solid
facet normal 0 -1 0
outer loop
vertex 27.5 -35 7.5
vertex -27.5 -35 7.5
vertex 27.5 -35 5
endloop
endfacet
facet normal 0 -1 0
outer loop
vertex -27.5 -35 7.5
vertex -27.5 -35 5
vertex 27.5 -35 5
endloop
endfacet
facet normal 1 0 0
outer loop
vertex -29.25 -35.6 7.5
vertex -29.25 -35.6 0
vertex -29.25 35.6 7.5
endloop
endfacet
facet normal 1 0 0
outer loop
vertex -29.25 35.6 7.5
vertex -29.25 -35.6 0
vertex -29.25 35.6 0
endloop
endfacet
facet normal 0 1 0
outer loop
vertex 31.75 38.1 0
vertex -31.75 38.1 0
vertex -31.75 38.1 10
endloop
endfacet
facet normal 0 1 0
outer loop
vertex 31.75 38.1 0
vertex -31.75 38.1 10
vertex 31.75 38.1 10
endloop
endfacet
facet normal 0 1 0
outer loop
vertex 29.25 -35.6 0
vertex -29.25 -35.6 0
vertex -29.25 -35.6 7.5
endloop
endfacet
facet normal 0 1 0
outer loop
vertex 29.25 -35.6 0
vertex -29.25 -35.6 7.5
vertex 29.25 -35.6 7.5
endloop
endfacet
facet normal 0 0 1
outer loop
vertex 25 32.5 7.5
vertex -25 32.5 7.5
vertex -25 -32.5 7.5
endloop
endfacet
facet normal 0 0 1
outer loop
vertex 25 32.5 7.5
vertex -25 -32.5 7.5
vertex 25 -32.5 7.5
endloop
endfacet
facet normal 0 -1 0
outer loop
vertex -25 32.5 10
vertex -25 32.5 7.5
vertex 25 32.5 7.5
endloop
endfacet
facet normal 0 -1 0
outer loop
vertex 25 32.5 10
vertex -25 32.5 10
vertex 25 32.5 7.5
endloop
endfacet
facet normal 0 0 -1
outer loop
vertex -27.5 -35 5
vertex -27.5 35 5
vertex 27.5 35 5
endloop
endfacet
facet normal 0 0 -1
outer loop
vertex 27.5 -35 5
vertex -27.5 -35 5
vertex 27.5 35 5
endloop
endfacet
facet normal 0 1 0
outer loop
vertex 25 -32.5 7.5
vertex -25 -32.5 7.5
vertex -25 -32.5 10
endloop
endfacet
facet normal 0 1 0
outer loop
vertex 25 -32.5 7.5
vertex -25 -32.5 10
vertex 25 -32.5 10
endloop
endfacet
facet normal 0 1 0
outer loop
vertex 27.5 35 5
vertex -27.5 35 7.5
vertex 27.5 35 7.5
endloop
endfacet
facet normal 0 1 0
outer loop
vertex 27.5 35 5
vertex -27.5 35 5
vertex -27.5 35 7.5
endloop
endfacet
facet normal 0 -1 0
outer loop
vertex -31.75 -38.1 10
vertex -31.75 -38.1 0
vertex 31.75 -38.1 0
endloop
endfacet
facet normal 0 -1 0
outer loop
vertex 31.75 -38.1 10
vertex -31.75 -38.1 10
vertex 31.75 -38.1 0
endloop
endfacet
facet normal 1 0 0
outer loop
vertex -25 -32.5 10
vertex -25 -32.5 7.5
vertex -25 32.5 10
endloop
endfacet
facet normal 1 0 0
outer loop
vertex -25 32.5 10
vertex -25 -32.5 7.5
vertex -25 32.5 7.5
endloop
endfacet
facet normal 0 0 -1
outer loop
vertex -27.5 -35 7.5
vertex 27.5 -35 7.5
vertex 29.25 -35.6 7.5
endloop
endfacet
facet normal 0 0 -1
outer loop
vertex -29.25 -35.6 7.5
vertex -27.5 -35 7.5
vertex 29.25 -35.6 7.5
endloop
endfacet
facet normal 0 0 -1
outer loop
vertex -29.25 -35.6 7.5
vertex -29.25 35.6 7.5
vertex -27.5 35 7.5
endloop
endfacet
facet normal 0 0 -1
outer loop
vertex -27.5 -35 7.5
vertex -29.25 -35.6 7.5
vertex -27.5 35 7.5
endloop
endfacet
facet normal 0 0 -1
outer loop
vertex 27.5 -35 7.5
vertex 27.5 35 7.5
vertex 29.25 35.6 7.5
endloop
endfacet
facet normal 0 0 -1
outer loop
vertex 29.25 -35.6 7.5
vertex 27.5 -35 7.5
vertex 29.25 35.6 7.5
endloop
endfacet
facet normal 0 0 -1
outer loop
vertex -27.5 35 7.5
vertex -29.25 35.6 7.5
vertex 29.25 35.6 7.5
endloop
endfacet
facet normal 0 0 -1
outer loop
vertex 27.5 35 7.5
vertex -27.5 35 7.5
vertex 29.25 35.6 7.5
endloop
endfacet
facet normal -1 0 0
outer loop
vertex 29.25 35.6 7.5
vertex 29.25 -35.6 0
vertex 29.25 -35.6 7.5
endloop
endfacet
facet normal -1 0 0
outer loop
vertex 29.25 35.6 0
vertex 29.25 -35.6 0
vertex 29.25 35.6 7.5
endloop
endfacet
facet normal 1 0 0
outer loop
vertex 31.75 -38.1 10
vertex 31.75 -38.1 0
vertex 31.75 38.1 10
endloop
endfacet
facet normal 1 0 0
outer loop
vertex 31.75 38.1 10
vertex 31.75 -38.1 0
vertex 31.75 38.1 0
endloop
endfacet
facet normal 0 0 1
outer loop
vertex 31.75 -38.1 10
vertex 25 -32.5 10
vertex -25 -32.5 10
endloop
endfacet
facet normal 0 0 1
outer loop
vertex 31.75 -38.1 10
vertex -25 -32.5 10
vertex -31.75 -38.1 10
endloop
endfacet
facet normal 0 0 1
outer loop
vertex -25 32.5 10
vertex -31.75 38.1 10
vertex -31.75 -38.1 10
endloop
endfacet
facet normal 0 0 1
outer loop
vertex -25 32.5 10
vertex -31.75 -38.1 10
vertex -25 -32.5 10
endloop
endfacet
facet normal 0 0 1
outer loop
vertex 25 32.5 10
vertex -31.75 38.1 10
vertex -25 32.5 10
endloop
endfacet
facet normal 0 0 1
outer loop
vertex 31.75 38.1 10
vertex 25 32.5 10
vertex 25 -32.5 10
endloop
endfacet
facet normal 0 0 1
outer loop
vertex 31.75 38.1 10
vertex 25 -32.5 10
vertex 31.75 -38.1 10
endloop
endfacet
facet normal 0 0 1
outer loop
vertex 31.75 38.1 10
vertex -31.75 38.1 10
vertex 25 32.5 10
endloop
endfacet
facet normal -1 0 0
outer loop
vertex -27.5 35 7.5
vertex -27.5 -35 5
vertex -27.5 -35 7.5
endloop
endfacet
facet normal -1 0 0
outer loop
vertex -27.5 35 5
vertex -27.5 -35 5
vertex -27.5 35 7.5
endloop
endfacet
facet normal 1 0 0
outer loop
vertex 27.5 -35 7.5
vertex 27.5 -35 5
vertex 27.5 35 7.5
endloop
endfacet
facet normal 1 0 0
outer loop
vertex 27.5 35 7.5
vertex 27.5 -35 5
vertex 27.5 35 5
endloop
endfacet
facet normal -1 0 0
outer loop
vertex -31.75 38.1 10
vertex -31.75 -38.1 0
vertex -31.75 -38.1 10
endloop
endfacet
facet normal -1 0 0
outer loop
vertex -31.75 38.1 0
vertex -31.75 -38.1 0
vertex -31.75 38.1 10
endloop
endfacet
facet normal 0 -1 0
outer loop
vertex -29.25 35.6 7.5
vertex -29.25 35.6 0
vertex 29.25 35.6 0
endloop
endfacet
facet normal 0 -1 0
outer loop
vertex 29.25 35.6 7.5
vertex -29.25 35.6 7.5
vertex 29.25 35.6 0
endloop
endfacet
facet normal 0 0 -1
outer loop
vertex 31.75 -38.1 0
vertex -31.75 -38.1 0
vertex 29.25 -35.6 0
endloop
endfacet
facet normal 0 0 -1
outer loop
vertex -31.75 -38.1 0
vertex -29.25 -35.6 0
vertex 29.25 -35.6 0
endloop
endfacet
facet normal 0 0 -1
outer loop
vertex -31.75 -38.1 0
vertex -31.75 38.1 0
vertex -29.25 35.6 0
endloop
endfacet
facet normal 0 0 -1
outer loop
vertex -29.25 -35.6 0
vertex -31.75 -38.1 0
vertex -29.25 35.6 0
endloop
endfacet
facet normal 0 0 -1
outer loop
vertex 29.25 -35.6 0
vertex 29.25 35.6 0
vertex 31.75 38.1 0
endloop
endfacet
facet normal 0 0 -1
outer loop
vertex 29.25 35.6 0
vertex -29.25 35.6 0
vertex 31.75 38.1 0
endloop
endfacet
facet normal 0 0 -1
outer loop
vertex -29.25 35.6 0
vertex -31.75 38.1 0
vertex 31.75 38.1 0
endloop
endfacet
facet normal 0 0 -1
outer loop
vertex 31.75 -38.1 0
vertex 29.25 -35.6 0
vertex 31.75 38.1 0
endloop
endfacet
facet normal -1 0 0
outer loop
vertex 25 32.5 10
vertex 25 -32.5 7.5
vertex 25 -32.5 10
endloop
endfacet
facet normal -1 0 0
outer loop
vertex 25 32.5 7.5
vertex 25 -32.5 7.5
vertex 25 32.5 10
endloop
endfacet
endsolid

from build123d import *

# Parameters (mm, degrees)
F0_W     = 50
F0_H     = 65
F1_DEPTH = 7.5
F0_W_2   = 63.5
F0_H_2   = 76.2
F2_DEPTH = 10
F3_T     = -2.5


with BuildPart() as f1:
    # F0 (on Top) → F1 (new body)
    with BuildSketch(Plane.XY):
        Rectangle(F0_W, F0_H)
    extrude(amount=F1_DEPTH)

    # F0 (on Top) → F2 (join)
    with BuildSketch(Plane.XY):
        Rectangle(F0_W_2, F0_H_2)
        Rectangle(F0_W, F0_H, mode=Mode.SUBTRACT)
    extrude(amount=F2_DEPTH)

    # F3
    f3_openings = [f1.faces().sort_by_distance(p)[0] for p in [
        (0, 0, 0),
    ]]
    offset(amount=F3_T, openings=f3_openings, kind=Kind.INTERSECTION)


solid = f1.part
